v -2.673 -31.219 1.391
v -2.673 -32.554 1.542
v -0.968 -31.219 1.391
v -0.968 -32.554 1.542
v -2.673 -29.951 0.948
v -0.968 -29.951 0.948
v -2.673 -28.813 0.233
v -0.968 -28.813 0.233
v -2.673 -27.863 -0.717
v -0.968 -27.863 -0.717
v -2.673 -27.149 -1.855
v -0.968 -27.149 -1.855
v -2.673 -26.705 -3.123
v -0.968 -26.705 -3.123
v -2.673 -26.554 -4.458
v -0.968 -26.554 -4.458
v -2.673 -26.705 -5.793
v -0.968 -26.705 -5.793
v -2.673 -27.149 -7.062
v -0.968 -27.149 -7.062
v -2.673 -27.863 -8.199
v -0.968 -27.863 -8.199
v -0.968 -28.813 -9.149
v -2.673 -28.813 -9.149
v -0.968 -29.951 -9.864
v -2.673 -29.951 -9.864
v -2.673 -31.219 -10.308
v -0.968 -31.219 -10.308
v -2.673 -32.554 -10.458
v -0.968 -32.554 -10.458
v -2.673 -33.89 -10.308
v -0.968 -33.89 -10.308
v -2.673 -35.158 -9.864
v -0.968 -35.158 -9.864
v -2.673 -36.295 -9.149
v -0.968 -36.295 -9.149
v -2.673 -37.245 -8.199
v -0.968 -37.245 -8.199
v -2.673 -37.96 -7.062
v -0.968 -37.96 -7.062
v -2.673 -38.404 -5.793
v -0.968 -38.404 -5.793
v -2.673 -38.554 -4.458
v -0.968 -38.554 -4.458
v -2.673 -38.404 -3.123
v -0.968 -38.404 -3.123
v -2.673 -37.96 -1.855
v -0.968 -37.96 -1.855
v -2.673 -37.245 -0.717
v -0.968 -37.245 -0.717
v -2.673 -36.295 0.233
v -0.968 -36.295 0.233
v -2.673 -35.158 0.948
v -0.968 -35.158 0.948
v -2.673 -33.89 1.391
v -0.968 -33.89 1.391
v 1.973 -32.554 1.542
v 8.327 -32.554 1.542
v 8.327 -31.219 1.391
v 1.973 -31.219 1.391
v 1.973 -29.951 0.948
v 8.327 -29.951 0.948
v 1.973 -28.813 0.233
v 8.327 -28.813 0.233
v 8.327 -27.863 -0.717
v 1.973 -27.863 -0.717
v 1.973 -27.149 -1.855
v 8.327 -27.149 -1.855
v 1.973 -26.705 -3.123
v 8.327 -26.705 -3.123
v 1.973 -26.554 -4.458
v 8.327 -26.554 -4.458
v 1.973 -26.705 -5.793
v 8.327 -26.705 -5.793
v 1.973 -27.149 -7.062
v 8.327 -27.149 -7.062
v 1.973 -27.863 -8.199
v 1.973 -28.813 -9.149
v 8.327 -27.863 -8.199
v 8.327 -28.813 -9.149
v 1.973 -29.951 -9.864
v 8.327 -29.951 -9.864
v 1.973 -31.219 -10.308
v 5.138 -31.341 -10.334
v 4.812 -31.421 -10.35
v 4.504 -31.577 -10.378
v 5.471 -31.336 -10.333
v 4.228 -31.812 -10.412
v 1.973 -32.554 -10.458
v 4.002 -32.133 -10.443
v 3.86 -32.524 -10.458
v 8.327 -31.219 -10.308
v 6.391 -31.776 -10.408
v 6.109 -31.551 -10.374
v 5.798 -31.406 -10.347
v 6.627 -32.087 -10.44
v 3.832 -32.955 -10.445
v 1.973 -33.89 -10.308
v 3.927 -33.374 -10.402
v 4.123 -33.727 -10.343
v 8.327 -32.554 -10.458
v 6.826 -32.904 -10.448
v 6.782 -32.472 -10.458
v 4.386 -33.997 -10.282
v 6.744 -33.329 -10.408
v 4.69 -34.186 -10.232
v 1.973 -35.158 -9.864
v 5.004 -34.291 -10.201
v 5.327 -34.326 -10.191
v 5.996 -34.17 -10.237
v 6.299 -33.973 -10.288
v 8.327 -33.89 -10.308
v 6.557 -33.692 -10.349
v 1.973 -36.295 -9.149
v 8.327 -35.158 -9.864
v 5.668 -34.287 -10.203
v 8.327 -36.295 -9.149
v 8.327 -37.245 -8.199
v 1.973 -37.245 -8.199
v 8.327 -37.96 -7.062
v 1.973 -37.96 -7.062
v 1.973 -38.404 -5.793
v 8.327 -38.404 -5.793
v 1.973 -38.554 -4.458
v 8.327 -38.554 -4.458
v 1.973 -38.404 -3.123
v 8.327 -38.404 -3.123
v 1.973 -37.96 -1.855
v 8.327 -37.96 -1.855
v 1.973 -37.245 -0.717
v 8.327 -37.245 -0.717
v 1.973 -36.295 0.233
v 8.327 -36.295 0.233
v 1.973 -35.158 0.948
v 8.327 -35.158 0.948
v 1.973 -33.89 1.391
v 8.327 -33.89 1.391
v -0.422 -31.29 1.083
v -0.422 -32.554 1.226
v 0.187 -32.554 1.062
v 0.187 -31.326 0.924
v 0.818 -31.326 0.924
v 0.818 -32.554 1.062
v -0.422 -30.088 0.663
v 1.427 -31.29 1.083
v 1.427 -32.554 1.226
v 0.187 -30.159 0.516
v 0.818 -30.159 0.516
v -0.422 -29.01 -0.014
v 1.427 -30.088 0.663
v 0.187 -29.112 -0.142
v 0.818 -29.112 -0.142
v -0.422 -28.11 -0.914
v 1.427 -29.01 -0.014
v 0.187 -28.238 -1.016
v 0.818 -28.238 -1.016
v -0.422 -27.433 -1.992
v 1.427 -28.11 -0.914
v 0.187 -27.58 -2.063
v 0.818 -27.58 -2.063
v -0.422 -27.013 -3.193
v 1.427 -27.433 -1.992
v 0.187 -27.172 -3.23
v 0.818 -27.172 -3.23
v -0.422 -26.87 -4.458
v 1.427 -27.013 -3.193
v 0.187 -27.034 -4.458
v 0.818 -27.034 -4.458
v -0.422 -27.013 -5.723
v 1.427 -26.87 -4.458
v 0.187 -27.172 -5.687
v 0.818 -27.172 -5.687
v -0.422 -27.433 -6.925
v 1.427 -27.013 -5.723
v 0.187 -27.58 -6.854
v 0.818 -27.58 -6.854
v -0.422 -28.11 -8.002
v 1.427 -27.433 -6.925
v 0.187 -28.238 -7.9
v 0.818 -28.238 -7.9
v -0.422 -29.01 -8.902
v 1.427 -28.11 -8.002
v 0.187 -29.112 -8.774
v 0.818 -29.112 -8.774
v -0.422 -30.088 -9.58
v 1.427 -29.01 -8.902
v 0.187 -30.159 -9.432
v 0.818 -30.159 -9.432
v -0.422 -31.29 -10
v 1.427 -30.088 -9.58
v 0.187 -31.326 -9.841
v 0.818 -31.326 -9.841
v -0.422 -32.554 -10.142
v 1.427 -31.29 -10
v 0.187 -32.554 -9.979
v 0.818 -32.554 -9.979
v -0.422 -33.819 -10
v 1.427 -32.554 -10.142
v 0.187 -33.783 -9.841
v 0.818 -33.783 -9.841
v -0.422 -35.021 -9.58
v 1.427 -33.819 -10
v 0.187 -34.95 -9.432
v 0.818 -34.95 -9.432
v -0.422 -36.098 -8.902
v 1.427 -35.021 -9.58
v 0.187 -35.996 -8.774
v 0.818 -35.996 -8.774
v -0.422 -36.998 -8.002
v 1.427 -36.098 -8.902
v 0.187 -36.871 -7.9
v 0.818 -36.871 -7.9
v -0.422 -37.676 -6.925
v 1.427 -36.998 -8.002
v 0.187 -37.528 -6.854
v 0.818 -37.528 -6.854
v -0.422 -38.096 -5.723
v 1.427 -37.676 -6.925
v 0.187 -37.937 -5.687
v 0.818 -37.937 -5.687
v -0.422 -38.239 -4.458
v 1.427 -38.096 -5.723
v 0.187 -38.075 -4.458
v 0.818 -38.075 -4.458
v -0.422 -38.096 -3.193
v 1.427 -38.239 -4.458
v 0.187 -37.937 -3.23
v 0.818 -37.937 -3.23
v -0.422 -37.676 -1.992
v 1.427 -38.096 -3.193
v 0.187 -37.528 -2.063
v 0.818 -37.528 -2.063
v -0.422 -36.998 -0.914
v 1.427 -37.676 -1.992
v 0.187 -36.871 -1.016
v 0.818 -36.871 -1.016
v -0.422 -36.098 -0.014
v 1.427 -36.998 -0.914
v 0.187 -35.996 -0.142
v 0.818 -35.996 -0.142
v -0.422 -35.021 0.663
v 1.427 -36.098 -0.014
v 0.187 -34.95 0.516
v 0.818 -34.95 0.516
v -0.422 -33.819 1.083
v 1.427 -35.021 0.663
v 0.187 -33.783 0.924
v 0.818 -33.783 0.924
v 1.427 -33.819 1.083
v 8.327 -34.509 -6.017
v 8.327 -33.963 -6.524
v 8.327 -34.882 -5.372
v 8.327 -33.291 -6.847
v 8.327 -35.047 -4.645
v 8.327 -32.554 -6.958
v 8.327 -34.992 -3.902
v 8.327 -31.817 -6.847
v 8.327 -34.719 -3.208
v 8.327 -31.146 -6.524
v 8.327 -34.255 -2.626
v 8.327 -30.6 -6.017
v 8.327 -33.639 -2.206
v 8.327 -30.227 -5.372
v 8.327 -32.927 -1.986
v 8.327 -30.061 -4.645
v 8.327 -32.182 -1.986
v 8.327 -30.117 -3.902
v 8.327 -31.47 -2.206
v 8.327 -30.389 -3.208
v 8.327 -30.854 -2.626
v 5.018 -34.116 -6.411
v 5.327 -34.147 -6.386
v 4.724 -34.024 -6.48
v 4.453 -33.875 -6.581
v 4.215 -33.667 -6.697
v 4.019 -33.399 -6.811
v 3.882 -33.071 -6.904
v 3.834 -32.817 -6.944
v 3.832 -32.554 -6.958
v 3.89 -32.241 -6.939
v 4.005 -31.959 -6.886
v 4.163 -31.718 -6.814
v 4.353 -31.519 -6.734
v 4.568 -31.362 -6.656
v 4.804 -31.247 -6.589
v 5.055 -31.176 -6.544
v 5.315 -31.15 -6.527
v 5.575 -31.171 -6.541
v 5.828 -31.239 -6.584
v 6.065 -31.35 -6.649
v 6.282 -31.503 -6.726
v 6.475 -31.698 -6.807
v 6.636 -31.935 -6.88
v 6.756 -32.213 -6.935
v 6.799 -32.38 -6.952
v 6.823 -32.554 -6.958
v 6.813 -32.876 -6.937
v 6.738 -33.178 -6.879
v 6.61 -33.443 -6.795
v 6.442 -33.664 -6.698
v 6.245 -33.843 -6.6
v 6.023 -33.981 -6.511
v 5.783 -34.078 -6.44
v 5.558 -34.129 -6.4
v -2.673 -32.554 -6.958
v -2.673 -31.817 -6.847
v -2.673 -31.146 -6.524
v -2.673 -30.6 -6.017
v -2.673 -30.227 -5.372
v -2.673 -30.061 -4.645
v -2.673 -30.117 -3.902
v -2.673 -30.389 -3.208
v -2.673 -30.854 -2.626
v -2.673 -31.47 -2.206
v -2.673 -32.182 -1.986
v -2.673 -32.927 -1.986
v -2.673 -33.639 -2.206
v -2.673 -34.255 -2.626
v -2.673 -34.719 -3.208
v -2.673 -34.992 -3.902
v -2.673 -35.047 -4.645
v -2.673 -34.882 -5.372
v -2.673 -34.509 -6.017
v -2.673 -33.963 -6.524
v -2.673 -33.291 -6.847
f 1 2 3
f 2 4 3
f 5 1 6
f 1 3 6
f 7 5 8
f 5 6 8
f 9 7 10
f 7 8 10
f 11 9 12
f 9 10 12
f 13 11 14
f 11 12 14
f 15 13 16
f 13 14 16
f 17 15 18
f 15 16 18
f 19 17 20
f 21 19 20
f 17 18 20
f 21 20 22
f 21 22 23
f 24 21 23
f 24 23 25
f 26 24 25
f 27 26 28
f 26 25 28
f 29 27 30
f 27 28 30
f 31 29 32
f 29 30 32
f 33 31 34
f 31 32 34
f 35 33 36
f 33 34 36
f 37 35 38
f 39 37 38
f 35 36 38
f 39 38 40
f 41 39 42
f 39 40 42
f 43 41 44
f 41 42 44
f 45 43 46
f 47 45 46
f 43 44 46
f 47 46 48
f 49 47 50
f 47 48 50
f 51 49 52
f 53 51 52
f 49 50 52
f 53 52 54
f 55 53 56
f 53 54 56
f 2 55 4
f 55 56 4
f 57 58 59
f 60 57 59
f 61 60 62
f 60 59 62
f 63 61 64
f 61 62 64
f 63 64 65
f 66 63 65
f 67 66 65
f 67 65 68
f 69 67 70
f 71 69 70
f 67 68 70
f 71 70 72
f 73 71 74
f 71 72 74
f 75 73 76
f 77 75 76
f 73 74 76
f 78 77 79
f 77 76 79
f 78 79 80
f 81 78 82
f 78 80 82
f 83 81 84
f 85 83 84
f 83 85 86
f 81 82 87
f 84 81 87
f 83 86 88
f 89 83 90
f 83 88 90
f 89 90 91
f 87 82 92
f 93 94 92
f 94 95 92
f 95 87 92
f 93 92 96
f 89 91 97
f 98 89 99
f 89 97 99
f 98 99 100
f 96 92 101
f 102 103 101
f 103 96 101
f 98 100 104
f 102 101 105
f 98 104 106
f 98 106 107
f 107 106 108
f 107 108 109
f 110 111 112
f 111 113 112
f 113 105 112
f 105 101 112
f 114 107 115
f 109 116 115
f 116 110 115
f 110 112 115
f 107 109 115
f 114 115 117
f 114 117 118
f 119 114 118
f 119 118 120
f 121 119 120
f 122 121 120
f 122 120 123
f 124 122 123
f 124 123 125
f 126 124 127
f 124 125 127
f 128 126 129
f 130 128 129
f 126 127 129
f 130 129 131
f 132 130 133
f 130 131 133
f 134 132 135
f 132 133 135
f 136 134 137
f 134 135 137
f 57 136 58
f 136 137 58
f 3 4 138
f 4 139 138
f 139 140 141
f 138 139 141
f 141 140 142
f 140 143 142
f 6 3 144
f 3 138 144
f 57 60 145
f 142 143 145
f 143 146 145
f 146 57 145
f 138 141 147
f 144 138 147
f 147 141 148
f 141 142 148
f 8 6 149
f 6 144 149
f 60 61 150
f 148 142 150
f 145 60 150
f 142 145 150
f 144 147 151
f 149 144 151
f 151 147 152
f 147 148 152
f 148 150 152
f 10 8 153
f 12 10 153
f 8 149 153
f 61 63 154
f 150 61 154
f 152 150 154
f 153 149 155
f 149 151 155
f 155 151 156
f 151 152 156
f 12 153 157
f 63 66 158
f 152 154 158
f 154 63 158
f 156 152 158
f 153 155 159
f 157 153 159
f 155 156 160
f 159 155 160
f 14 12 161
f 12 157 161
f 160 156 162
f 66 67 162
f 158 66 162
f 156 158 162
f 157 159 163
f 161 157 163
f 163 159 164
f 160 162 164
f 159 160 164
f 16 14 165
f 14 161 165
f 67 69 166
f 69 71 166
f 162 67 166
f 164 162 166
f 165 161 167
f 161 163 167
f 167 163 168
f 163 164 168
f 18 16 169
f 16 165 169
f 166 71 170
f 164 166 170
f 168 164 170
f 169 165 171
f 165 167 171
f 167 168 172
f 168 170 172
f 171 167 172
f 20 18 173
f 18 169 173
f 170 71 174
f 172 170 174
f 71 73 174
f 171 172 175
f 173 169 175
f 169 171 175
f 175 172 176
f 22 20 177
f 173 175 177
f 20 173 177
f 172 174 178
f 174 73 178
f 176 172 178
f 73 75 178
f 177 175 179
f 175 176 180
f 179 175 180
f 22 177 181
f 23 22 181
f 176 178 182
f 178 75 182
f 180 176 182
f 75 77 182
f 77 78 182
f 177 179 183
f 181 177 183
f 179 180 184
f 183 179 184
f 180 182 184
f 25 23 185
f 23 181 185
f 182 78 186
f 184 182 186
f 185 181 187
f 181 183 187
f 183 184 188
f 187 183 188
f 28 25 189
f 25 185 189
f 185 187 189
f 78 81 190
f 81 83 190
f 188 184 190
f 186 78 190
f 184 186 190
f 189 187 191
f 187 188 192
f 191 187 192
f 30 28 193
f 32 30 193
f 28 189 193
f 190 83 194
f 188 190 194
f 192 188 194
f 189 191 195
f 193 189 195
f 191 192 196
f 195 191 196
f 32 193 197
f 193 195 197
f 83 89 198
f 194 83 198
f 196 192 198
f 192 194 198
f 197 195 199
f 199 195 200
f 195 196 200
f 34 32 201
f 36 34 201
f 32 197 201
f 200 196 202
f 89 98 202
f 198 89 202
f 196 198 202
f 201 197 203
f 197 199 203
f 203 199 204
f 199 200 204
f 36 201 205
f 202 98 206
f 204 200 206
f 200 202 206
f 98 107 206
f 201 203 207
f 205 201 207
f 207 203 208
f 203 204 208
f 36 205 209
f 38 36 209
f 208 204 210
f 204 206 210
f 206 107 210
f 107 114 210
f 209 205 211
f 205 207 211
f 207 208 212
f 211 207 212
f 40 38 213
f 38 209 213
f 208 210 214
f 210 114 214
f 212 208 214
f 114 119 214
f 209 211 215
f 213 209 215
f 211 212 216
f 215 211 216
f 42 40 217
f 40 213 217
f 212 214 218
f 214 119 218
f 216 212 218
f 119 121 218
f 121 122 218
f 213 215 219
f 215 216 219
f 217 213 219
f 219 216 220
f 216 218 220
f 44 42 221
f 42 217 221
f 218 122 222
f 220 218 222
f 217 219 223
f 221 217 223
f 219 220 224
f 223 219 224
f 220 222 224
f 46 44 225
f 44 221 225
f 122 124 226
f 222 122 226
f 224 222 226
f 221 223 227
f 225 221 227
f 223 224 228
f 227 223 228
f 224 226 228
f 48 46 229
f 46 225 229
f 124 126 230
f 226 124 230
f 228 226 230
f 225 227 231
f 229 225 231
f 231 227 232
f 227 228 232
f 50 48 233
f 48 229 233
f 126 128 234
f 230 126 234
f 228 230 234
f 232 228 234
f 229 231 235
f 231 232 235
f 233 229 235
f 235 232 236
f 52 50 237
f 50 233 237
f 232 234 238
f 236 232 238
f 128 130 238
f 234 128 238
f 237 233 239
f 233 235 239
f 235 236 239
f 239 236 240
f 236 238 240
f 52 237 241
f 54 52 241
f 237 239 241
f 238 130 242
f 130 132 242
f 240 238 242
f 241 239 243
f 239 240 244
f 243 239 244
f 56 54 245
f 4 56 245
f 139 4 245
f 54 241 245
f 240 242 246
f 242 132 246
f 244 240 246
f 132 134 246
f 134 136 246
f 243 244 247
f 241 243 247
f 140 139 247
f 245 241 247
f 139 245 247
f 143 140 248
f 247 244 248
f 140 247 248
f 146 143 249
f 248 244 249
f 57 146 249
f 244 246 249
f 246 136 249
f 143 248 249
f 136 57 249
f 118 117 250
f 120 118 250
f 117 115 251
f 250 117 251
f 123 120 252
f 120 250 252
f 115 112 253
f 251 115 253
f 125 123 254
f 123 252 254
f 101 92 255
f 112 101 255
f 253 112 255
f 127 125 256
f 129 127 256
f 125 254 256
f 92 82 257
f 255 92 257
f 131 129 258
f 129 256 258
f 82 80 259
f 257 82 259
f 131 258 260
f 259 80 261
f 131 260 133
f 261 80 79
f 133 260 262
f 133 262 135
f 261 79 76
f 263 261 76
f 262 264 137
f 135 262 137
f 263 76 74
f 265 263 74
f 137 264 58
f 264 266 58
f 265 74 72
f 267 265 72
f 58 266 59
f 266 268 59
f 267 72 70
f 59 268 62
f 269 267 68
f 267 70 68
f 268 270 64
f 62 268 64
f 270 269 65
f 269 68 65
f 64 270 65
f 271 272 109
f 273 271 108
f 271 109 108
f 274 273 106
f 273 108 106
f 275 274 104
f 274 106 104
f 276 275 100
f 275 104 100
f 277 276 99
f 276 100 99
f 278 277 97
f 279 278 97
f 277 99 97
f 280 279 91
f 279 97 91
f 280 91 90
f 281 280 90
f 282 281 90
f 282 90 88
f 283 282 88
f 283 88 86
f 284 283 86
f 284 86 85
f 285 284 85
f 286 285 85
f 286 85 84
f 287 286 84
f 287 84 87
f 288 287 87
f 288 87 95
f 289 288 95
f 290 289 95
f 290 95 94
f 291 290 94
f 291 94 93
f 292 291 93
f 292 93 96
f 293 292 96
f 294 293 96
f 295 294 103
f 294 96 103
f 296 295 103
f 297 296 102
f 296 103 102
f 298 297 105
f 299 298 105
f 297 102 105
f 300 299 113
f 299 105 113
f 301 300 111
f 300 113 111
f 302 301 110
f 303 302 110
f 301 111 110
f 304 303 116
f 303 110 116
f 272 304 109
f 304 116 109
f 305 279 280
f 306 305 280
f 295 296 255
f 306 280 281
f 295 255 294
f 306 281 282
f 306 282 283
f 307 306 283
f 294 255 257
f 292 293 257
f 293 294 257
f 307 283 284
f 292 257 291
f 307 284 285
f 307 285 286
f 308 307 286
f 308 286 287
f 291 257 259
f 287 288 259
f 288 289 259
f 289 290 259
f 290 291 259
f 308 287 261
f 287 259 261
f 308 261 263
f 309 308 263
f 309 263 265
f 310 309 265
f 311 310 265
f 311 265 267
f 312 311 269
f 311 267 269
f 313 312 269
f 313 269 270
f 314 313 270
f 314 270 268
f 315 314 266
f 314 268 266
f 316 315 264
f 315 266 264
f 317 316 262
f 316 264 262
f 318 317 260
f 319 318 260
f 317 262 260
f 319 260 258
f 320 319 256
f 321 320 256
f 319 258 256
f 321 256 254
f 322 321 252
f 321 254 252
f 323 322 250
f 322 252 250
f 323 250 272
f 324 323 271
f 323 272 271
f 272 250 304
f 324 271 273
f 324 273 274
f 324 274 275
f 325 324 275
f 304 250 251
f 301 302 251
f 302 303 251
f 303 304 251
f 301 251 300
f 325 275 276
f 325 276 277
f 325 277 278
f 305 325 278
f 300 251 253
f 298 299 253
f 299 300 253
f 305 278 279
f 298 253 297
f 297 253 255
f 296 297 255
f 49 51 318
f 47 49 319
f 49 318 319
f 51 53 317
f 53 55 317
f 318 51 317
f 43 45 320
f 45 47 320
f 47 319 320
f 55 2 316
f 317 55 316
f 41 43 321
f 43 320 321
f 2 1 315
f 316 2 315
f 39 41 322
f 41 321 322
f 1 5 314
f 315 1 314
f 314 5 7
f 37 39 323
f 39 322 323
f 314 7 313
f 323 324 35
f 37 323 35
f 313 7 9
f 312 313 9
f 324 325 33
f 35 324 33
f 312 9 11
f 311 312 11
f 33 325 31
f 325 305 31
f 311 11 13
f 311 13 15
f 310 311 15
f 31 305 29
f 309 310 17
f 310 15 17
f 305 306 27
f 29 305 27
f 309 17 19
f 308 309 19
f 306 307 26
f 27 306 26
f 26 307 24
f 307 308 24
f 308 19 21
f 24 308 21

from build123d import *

# Parameters (mm, degrees)
F_5_0_5_DIAMETER_HOLE1_D      = 5
F_3_0_3_DIAMETER_HOLE1_REACH  = 17.726
F_3_0_3_DIAMETER_HOLE1_BORE_R = 1.5


with BuildPart() as part:
    # Sketch1 → Revolve1 (revolve)
    with BuildSketch(Plane(origin=(0, 0, -4.458227774), x_dir=(-1, 0, 0), z_dir=(0, 0, -1)), mode=Mode.PRIVATE) as revolve1_sk:
        with BuildLine():
            Line((-8.327233411, -26.554384432), (-8.327233411, -32.554384432))
            Line((-8.327233411, -32.554384432), (2.672766589, -32.554384432))
            Line((2.672766589, -32.554384432), (2.672766589, -26.554384432))
            Line((2.672766589, -26.554384432), (0.968480701, -26.554384432))
            ThreePointArc((0.968480701, -26.554384432), (-0.502233411, -27.054384432), (-1.972947524, -26.554384432))
            Line((-1.972947524, -26.554384432), (-8.327233411, -26.554384432))
        make_face()
    revolve(revolve1_sk.sketch.rotate(Axis((8.327233411, -32.554384432, -4.458227774), (-1, 0, 0)), 270), axis=Axis((8.327233411, -32.554384432, -4.458227774), (-1, 0, 0)))

    # Ø5.0 (5) Diameter Hole1 (through all)
    with Locations(Plane.ZY.offset(2.672766589)):
        with Locations((-4.458227774, -32.554384432)):
            Hole(F_5_0_5_DIAMETER_HOLE1_D / 2)

    # Ø3.0 (3) Diameter Hole1 bore (on position points) → Ø3.0 (3) Diameter Hole1 (cut, up to next)
    with BuildSketch(Plane(origin=(5.327233411, -32.836401262, -10.451596318), x_dir=(0, -0.998894757378, 0.047002805043), z_dir=(0, -0.047002805043, -0.998894757378)), mode=Mode.PRIVATE) as f_3_0_3_diameter_hole1_sk1:
        Circle(F_3_0_3_DIAMETER_HOLE1_BORE_R)
    f_3_0_3_diameter_hole1_tool1 = extrude(f_3_0_3_diameter_hole1_sk1.sketch, amount=-F_3_0_3_DIAMETER_HOLE1_REACH, mode=Mode.PRIVATE) & part.part
    add(f_3_0_3_diameter_hole1_tool1.solids().sort_by_distance((5.327233, -32.836401, -10.451596))[0], mode=Mode.SUBTRACT)


solid = part.part
